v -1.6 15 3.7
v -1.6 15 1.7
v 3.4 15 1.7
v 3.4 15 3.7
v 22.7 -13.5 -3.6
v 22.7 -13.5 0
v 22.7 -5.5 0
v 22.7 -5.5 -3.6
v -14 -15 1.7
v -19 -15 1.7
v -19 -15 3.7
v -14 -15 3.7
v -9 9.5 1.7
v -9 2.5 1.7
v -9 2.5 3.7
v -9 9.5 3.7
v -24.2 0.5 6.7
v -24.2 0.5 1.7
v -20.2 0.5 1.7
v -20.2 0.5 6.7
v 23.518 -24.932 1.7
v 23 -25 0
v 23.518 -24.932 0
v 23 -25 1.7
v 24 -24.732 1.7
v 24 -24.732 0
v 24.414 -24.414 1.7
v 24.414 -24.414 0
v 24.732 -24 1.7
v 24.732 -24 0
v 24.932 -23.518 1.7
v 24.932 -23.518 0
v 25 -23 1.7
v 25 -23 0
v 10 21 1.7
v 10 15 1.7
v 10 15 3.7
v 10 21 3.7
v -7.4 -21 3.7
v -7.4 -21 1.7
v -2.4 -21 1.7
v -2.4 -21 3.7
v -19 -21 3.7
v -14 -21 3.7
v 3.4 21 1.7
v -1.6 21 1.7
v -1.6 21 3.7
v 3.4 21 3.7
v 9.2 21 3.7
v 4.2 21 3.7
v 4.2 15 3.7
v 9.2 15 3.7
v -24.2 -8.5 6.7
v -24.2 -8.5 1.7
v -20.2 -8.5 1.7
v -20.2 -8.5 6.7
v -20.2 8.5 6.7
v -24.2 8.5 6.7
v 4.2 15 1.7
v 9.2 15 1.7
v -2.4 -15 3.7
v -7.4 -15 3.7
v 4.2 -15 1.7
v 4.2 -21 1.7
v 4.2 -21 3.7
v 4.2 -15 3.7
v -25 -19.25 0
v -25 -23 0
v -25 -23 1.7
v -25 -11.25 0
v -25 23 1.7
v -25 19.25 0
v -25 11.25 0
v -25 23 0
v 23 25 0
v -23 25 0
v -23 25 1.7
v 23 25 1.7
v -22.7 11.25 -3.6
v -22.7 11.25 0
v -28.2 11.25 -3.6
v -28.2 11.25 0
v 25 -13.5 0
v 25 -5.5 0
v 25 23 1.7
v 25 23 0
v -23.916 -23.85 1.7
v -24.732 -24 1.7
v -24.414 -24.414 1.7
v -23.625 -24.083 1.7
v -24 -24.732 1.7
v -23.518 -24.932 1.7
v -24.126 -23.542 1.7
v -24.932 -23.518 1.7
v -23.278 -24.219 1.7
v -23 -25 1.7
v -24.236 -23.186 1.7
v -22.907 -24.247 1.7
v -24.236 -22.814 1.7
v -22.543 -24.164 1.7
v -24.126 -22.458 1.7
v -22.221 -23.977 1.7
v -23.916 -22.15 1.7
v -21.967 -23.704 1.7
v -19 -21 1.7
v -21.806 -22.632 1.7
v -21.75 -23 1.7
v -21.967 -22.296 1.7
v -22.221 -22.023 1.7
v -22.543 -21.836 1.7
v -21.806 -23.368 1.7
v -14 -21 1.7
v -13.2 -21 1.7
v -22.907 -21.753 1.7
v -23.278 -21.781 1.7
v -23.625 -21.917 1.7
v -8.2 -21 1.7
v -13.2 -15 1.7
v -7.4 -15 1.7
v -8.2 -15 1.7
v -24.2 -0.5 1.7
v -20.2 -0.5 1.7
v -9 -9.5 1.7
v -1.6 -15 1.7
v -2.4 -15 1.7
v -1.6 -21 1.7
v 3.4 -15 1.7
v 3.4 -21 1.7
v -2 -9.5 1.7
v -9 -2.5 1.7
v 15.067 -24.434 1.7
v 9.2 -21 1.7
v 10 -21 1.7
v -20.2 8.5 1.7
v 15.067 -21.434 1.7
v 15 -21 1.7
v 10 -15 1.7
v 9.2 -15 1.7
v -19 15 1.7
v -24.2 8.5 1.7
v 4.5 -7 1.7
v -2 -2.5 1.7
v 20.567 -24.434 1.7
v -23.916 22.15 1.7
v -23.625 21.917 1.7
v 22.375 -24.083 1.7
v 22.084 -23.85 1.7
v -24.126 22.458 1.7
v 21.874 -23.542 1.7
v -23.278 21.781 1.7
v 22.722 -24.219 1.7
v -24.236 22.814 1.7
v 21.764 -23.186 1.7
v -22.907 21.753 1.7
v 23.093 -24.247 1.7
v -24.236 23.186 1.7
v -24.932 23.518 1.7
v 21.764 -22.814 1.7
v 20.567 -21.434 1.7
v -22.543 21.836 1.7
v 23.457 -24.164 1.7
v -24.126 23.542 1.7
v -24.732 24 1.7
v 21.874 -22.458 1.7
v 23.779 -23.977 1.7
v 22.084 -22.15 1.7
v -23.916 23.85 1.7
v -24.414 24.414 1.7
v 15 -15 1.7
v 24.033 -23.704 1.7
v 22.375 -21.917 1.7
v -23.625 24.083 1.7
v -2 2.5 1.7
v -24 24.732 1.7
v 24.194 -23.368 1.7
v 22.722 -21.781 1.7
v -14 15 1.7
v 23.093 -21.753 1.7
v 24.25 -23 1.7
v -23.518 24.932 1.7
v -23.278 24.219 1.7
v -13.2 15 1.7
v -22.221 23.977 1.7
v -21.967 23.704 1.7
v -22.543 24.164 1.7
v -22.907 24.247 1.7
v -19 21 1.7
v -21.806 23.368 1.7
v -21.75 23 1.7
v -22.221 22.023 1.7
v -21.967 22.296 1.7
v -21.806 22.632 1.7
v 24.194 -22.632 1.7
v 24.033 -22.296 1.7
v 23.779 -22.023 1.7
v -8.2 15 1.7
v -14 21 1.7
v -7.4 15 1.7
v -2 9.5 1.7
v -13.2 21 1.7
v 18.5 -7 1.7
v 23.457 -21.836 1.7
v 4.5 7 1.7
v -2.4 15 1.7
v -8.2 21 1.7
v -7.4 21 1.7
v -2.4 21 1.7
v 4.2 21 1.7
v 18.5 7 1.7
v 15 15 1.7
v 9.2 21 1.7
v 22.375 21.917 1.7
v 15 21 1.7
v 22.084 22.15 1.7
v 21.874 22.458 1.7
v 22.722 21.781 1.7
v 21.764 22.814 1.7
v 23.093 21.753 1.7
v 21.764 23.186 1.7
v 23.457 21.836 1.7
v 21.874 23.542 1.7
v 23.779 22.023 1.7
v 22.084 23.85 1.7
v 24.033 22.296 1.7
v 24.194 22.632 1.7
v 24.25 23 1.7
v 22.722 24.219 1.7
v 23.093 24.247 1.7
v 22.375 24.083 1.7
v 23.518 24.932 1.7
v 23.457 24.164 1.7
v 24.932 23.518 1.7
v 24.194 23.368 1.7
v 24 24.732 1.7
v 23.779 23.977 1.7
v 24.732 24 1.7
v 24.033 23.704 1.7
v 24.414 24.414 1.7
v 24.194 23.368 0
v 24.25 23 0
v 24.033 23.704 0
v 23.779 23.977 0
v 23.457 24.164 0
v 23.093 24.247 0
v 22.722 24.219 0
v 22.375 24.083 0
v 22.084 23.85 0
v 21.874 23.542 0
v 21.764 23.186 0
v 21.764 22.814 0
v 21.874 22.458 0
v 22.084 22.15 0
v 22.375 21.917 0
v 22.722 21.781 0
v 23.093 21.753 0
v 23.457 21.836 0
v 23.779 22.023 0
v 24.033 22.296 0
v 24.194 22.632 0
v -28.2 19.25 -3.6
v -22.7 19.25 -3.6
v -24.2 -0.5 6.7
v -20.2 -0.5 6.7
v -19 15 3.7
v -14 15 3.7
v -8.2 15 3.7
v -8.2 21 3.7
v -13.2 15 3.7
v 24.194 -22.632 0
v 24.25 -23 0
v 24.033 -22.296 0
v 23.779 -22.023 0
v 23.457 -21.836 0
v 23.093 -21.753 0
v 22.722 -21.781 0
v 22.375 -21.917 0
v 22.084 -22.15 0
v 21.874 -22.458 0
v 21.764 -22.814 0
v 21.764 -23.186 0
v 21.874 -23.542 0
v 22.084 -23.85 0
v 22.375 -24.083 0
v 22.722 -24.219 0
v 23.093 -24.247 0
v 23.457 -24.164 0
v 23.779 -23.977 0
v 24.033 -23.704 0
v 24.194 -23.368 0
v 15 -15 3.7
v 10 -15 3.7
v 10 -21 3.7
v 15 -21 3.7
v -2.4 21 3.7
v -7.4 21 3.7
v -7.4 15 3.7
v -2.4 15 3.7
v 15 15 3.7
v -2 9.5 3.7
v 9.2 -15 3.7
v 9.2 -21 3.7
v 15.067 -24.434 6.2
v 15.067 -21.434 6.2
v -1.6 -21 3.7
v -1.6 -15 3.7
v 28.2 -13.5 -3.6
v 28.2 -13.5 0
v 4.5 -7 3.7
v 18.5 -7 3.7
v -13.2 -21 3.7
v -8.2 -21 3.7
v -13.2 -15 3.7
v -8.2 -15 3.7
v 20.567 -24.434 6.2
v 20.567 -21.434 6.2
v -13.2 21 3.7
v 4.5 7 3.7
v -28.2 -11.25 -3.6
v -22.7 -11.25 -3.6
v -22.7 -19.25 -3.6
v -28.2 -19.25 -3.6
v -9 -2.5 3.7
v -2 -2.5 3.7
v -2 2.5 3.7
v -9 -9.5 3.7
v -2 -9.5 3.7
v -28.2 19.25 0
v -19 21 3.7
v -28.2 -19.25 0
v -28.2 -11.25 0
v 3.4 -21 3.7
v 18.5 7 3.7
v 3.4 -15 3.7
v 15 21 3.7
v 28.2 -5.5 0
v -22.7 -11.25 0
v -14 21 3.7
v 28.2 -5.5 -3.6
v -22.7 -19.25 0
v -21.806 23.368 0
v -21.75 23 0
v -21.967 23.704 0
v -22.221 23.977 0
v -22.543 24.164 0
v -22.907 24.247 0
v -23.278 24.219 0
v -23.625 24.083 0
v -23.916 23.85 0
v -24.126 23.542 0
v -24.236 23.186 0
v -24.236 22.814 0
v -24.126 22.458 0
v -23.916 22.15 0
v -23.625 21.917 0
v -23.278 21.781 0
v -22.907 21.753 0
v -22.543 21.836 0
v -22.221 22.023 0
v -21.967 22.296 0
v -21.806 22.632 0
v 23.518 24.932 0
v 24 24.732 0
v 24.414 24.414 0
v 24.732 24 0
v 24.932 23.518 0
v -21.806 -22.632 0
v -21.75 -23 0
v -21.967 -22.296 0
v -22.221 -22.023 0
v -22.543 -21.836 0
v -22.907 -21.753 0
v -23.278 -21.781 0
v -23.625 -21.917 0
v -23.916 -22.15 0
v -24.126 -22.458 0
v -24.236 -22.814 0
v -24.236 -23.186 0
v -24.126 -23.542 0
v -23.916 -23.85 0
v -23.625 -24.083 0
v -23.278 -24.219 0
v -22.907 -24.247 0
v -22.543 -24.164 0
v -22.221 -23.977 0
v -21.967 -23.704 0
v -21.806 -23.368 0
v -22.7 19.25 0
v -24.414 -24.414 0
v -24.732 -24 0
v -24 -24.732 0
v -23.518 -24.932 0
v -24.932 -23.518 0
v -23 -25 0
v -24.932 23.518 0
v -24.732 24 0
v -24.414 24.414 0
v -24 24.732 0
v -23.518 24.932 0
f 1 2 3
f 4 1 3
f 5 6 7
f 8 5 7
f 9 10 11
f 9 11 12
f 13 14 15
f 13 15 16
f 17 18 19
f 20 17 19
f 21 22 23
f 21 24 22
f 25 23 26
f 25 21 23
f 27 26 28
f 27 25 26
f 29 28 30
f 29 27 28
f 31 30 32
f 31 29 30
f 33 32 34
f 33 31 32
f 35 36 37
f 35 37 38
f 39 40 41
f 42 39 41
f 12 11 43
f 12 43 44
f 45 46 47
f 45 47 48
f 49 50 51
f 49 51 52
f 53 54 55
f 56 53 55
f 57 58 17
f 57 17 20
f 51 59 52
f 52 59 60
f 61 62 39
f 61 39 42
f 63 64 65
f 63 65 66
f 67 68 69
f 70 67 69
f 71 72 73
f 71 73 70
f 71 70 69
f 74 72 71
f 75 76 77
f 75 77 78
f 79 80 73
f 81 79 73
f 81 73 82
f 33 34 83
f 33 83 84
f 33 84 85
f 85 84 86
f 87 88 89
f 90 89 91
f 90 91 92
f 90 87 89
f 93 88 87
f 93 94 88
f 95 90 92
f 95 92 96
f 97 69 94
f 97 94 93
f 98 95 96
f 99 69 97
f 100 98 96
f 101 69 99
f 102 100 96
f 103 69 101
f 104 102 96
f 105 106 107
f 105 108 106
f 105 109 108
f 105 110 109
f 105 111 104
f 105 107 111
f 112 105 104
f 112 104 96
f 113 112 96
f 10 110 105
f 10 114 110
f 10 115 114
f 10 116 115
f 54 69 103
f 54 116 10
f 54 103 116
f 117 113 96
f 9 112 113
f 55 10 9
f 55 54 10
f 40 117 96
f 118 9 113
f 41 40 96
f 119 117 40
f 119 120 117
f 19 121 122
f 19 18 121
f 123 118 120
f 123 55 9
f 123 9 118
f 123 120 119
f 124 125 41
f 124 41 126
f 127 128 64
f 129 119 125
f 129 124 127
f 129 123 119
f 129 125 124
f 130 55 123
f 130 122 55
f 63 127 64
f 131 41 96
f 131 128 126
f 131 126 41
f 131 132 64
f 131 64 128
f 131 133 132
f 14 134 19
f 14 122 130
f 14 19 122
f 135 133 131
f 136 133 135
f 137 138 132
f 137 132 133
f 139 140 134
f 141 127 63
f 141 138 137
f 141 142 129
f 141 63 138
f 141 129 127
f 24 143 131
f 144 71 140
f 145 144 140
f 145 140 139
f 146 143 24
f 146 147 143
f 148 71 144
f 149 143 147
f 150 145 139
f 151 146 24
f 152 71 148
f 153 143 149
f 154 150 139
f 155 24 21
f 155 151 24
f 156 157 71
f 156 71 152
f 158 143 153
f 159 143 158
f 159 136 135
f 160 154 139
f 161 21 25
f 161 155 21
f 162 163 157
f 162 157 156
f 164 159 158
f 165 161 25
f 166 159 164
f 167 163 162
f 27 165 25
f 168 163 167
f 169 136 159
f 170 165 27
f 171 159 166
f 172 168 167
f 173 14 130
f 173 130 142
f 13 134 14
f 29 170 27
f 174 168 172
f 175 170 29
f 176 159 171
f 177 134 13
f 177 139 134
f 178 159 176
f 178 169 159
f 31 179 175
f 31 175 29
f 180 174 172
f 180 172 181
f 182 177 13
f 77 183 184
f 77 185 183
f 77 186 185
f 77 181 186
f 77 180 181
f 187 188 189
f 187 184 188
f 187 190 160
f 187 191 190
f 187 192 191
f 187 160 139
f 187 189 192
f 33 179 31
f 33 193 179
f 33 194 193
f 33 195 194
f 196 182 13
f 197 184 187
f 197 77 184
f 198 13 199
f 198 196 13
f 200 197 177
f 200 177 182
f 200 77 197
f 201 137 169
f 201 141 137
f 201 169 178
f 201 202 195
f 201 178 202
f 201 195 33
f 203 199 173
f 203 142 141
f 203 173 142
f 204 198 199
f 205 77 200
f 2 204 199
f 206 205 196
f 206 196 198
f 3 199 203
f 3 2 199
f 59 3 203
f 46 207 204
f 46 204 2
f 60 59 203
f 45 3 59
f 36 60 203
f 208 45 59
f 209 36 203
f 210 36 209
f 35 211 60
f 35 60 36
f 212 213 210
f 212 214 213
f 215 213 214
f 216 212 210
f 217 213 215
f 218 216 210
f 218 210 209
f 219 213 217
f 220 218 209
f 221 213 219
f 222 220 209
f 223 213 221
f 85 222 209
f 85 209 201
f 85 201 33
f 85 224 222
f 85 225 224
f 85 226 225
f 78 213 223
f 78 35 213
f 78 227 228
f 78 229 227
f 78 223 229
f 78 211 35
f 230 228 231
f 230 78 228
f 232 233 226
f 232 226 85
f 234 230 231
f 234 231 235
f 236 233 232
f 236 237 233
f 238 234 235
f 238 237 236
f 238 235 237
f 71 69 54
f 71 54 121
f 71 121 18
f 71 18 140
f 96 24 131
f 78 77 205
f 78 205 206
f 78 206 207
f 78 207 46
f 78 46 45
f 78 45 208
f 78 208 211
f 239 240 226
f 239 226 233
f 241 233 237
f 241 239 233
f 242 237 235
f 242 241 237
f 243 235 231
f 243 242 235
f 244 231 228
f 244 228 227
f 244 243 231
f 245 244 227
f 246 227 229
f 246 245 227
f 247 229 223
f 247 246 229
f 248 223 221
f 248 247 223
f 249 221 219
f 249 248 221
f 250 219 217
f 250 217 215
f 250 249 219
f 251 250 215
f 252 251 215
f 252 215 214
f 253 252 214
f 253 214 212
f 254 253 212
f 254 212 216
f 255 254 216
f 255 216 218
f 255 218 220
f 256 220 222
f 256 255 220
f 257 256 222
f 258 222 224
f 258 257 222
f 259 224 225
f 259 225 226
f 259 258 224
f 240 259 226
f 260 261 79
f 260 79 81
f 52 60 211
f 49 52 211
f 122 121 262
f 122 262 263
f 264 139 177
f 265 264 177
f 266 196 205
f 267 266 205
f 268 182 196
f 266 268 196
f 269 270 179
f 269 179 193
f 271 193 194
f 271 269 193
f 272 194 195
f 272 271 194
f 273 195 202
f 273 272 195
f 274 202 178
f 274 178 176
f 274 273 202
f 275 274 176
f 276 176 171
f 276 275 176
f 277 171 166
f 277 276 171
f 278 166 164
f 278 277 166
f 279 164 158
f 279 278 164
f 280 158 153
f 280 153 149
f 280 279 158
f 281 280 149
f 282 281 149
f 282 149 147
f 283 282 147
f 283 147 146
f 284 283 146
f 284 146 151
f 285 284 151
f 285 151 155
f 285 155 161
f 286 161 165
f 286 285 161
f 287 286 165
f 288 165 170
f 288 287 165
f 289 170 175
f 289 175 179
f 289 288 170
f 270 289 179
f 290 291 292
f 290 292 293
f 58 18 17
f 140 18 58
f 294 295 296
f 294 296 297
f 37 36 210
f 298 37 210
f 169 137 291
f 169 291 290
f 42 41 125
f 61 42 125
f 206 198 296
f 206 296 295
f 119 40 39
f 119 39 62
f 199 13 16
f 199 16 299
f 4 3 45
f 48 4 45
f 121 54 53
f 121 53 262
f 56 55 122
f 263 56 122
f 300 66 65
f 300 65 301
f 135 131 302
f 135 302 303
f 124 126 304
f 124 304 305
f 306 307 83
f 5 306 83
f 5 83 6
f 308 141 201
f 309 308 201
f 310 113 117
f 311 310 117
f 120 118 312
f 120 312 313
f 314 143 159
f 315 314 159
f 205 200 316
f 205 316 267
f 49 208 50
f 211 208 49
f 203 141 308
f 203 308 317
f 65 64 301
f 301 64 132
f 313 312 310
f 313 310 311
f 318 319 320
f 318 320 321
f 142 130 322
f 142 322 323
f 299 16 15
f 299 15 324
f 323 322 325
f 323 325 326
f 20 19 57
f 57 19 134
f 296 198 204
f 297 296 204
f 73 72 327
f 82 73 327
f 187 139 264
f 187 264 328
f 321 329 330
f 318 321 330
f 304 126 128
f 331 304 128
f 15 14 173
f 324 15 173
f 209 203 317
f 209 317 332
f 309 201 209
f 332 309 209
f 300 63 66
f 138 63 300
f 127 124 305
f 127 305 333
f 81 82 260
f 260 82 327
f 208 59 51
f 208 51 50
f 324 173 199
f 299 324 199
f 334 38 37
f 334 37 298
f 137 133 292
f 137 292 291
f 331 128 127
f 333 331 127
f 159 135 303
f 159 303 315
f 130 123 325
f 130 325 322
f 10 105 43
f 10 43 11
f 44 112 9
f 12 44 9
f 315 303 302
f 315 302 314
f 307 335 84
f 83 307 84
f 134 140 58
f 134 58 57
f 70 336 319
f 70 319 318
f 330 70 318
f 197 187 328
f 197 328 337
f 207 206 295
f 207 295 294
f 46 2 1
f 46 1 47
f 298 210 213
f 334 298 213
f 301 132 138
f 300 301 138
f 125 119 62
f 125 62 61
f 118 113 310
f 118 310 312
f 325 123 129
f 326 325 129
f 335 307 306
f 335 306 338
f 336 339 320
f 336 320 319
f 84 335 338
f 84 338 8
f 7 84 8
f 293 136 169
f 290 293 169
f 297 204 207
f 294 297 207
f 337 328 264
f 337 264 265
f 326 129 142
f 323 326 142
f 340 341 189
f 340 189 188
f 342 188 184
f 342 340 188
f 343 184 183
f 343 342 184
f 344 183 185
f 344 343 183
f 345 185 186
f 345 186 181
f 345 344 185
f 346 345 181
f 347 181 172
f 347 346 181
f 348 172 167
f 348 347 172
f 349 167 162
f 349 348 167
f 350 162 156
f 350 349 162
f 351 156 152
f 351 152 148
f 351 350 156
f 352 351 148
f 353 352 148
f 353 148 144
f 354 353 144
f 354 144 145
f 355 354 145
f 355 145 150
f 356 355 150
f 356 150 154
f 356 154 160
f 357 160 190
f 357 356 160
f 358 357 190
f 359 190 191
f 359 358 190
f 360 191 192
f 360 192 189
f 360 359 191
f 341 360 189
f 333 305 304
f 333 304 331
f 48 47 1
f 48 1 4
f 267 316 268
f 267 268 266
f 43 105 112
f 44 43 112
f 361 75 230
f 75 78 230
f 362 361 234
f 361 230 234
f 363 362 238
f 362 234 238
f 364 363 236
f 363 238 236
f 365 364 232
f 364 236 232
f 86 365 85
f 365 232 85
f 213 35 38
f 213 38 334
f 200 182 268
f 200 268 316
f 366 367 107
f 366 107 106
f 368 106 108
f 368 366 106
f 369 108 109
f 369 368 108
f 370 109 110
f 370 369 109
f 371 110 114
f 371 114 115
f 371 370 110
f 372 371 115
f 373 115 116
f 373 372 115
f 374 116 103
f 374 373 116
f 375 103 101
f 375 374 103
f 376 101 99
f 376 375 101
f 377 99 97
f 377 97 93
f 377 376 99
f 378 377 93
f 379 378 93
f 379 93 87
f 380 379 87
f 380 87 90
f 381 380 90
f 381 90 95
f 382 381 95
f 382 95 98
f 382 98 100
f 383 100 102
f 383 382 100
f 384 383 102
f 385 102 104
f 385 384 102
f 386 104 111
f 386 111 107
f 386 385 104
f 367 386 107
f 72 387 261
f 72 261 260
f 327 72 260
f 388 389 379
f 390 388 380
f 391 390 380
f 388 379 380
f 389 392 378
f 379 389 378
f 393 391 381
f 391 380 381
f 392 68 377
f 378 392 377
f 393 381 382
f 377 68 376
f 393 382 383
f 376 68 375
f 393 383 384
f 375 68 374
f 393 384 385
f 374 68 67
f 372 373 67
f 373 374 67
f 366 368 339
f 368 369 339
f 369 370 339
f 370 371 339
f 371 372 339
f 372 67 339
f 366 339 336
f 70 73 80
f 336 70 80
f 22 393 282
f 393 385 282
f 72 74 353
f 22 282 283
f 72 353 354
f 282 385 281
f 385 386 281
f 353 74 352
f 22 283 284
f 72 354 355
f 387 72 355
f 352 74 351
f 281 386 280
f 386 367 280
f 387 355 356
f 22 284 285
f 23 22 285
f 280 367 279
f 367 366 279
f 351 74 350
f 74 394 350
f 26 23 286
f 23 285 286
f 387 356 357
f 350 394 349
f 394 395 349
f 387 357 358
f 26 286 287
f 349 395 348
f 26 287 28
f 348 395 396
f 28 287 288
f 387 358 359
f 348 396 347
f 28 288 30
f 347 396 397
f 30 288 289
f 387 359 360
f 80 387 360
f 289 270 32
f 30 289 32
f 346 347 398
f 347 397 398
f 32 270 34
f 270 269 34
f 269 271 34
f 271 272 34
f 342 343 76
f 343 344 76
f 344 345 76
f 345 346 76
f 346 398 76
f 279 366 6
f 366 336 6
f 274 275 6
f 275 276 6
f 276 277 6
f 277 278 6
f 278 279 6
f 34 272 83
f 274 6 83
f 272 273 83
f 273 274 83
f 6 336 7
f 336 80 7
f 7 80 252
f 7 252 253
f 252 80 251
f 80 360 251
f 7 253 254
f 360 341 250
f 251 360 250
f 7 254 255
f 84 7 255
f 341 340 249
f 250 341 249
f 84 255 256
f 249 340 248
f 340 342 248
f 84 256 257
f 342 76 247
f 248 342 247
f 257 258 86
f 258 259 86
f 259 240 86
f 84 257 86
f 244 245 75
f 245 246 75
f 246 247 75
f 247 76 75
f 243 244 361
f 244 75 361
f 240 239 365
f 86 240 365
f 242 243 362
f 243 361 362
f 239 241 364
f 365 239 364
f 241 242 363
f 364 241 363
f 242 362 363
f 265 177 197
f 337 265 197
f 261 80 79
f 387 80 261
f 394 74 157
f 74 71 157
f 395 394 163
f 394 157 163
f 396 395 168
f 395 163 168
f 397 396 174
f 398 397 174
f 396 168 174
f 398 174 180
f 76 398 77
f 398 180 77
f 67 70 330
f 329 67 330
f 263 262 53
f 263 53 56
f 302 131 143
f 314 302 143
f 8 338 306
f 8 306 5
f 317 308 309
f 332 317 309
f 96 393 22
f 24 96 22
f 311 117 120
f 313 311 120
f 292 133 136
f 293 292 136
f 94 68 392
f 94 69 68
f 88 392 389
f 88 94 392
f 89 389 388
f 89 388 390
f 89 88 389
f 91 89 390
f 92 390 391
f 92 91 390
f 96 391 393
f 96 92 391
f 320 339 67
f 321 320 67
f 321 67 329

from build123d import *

# Parameters (mm, degrees)
SKIZZE1_W                       = 50
SKIZZE1_H                       = 50
SKIZZE1_R                       = 1.25
AUFSATZ_LINEAR_AUSTRAGEN1_DEPTH = 1.7
VERRUNDUNG1_R                   = 2
SKIZZE2_W                       = 14
SKIZZE2_H                       = 14
SKIZZE2_W_2                     = 7
SKIZZE2_H_2                     = 7
SKIZZE2_W_3                     = 5
SKIZZE2_H_3                     = 6
AUFSATZ_LINEAR_AUSTRAGEN2_DEPTH = 2
SKIZZE3_W                       = 4
SKIZZE3_H                       = 8
AUFSATZ_LINEAR_AUSTRAGEN3_DEPTH = 5
SKIZZE5_W                       = 5.5
SKIZZE5_H                       = 3
AUFSATZ_LINEAR_AUSTRAGEN5_DEPTH = 4.5
SKIZZE6_W                       = 5.5
SKIZZE6_H                       = 8
AUFSATZ_LINEAR_AUSTRAGEN6_DEPTH = 3.6


with BuildPart() as part:
    # Skizze1 → Aufsatz-Linear austragen1 (new body)
    with BuildSketch(Plane.XY):
        Rectangle(SKIZZE1_W, SKIZZE1_H)
        with Locations((-23, 23)):
            Circle(SKIZZE1_R, mode=Mode.SUBTRACT)
        with Locations((23, 23)):
            Circle(SKIZZE1_R, mode=Mode.SUBTRACT)
        with Locations((23, -23)):
            Circle(SKIZZE1_R, mode=Mode.SUBTRACT)
        with Locations((-23, -23)):
            Circle(SKIZZE1_R, mode=Mode.SUBTRACT)
    extrude(amount=AUFSATZ_LINEAR_AUSTRAGEN1_DEPTH)

    # Verrundung1
    verrundung1_edges = [part.edges().sort_by_distance(p)[0] for p in [
        (25, 25, 0.85),
        (25, -25, 0.85),
        (-25, -25, 0.85),
        (-25, 25, 0.85),
    ]]
    fillet(verrundung1_edges, radius=VERRUNDUNG1_R)

    # Skizze2 → Aufsatz-Linear austragen2 (add)
    with BuildSketch(Plane.XY.offset(1.7)):
        with Locations((11.5, 0)):
            Rectangle(SKIZZE2_W, SKIZZE2_H)
        with Locations((-5.5, 6)):
            Rectangle(SKIZZE2_W_2, SKIZZE2_H_2)
        with Locations((-5.5, -6)):
            Rectangle(SKIZZE2_W_2, SKIZZE2_H_2)
        with Locations((-10.7, 18)):
            Rectangle(SKIZZE2_W_3, SKIZZE2_H_3)
        with Locations((-16.5, 18)):
            Rectangle(SKIZZE2_W_3, SKIZZE2_H_3)
        with Locations((-4.9, 18)):
            Rectangle(SKIZZE2_W_3, SKIZZE2_H_3)
        with Locations((0.9, 18)):
            Rectangle(SKIZZE2_W_3, SKIZZE2_H_3)
        with Locations((6.7, 18)):
            Rectangle(SKIZZE2_W_3, SKIZZE2_H_3)
        with Locations((12.5, 18)):
            Rectangle(SKIZZE2_W_3, SKIZZE2_H_3)
        with Locations((12.5, -18)):
            Rectangle(SKIZZE2_W_3, SKIZZE2_H_3)
        with Locations((6.7, -18)):
            Rectangle(SKIZZE2_W_3, SKIZZE2_H_3)
        with Locations((0.9, -18)):
            Rectangle(SKIZZE2_W_3, SKIZZE2_H_3)
        with Locations((-4.9, -18)):
            Rectangle(SKIZZE2_W_3, SKIZZE2_H_3)
        with Locations((-10.7, -18)):
            Rectangle(SKIZZE2_W_3, SKIZZE2_H_3)
        with Locations((-16.5, -18)):
            Rectangle(SKIZZE2_W_3, SKIZZE2_H_3)
    extrude(amount=AUFSATZ_LINEAR_AUSTRAGEN2_DEPTH)

    # Skizze3 → Aufsatz-Linear austragen3 (add)
    with BuildSketch(Plane.XY.offset(1.7)):
        with Locations((-22.2, -4.5)):
            Rectangle(SKIZZE3_W, SKIZZE3_H)
        with Locations((-22.2, 4.5)):
            Rectangle(SKIZZE3_W, SKIZZE3_H)
    extrude(amount=AUFSATZ_LINEAR_AUSTRAGEN3_DEPTH)

    # Skizze5 → Aufsatz-Linear austragen5 (add)
    with BuildSketch(Plane.XY.offset(1.7)):
        with Locations((17.817192877, -22.933750346)):
            Rectangle(SKIZZE5_W, SKIZZE5_H)
    extrude(amount=AUFSATZ_LINEAR_AUSTRAGEN5_DEPTH)

    # Skizze6 → Aufsatz-Linear austragen6 (add)
    with BuildSketch(Plane(origin=(0, 0, 0), x_dir=(-1, 0, 0), z_dir=(0, 0, -1))):
        with Locations((25.45, 15.25)):
            Rectangle(SKIZZE6_W, SKIZZE6_H)
        with Locations((25.45, -15.25)):
            Rectangle(SKIZZE6_W, SKIZZE6_H)
        with Locations((-25.45, -9.5)):
            Rectangle(SKIZZE6_W, SKIZZE6_H)
    extrude(amount=AUFSATZ_LINEAR_AUSTRAGEN6_DEPTH)


solid = part.part
